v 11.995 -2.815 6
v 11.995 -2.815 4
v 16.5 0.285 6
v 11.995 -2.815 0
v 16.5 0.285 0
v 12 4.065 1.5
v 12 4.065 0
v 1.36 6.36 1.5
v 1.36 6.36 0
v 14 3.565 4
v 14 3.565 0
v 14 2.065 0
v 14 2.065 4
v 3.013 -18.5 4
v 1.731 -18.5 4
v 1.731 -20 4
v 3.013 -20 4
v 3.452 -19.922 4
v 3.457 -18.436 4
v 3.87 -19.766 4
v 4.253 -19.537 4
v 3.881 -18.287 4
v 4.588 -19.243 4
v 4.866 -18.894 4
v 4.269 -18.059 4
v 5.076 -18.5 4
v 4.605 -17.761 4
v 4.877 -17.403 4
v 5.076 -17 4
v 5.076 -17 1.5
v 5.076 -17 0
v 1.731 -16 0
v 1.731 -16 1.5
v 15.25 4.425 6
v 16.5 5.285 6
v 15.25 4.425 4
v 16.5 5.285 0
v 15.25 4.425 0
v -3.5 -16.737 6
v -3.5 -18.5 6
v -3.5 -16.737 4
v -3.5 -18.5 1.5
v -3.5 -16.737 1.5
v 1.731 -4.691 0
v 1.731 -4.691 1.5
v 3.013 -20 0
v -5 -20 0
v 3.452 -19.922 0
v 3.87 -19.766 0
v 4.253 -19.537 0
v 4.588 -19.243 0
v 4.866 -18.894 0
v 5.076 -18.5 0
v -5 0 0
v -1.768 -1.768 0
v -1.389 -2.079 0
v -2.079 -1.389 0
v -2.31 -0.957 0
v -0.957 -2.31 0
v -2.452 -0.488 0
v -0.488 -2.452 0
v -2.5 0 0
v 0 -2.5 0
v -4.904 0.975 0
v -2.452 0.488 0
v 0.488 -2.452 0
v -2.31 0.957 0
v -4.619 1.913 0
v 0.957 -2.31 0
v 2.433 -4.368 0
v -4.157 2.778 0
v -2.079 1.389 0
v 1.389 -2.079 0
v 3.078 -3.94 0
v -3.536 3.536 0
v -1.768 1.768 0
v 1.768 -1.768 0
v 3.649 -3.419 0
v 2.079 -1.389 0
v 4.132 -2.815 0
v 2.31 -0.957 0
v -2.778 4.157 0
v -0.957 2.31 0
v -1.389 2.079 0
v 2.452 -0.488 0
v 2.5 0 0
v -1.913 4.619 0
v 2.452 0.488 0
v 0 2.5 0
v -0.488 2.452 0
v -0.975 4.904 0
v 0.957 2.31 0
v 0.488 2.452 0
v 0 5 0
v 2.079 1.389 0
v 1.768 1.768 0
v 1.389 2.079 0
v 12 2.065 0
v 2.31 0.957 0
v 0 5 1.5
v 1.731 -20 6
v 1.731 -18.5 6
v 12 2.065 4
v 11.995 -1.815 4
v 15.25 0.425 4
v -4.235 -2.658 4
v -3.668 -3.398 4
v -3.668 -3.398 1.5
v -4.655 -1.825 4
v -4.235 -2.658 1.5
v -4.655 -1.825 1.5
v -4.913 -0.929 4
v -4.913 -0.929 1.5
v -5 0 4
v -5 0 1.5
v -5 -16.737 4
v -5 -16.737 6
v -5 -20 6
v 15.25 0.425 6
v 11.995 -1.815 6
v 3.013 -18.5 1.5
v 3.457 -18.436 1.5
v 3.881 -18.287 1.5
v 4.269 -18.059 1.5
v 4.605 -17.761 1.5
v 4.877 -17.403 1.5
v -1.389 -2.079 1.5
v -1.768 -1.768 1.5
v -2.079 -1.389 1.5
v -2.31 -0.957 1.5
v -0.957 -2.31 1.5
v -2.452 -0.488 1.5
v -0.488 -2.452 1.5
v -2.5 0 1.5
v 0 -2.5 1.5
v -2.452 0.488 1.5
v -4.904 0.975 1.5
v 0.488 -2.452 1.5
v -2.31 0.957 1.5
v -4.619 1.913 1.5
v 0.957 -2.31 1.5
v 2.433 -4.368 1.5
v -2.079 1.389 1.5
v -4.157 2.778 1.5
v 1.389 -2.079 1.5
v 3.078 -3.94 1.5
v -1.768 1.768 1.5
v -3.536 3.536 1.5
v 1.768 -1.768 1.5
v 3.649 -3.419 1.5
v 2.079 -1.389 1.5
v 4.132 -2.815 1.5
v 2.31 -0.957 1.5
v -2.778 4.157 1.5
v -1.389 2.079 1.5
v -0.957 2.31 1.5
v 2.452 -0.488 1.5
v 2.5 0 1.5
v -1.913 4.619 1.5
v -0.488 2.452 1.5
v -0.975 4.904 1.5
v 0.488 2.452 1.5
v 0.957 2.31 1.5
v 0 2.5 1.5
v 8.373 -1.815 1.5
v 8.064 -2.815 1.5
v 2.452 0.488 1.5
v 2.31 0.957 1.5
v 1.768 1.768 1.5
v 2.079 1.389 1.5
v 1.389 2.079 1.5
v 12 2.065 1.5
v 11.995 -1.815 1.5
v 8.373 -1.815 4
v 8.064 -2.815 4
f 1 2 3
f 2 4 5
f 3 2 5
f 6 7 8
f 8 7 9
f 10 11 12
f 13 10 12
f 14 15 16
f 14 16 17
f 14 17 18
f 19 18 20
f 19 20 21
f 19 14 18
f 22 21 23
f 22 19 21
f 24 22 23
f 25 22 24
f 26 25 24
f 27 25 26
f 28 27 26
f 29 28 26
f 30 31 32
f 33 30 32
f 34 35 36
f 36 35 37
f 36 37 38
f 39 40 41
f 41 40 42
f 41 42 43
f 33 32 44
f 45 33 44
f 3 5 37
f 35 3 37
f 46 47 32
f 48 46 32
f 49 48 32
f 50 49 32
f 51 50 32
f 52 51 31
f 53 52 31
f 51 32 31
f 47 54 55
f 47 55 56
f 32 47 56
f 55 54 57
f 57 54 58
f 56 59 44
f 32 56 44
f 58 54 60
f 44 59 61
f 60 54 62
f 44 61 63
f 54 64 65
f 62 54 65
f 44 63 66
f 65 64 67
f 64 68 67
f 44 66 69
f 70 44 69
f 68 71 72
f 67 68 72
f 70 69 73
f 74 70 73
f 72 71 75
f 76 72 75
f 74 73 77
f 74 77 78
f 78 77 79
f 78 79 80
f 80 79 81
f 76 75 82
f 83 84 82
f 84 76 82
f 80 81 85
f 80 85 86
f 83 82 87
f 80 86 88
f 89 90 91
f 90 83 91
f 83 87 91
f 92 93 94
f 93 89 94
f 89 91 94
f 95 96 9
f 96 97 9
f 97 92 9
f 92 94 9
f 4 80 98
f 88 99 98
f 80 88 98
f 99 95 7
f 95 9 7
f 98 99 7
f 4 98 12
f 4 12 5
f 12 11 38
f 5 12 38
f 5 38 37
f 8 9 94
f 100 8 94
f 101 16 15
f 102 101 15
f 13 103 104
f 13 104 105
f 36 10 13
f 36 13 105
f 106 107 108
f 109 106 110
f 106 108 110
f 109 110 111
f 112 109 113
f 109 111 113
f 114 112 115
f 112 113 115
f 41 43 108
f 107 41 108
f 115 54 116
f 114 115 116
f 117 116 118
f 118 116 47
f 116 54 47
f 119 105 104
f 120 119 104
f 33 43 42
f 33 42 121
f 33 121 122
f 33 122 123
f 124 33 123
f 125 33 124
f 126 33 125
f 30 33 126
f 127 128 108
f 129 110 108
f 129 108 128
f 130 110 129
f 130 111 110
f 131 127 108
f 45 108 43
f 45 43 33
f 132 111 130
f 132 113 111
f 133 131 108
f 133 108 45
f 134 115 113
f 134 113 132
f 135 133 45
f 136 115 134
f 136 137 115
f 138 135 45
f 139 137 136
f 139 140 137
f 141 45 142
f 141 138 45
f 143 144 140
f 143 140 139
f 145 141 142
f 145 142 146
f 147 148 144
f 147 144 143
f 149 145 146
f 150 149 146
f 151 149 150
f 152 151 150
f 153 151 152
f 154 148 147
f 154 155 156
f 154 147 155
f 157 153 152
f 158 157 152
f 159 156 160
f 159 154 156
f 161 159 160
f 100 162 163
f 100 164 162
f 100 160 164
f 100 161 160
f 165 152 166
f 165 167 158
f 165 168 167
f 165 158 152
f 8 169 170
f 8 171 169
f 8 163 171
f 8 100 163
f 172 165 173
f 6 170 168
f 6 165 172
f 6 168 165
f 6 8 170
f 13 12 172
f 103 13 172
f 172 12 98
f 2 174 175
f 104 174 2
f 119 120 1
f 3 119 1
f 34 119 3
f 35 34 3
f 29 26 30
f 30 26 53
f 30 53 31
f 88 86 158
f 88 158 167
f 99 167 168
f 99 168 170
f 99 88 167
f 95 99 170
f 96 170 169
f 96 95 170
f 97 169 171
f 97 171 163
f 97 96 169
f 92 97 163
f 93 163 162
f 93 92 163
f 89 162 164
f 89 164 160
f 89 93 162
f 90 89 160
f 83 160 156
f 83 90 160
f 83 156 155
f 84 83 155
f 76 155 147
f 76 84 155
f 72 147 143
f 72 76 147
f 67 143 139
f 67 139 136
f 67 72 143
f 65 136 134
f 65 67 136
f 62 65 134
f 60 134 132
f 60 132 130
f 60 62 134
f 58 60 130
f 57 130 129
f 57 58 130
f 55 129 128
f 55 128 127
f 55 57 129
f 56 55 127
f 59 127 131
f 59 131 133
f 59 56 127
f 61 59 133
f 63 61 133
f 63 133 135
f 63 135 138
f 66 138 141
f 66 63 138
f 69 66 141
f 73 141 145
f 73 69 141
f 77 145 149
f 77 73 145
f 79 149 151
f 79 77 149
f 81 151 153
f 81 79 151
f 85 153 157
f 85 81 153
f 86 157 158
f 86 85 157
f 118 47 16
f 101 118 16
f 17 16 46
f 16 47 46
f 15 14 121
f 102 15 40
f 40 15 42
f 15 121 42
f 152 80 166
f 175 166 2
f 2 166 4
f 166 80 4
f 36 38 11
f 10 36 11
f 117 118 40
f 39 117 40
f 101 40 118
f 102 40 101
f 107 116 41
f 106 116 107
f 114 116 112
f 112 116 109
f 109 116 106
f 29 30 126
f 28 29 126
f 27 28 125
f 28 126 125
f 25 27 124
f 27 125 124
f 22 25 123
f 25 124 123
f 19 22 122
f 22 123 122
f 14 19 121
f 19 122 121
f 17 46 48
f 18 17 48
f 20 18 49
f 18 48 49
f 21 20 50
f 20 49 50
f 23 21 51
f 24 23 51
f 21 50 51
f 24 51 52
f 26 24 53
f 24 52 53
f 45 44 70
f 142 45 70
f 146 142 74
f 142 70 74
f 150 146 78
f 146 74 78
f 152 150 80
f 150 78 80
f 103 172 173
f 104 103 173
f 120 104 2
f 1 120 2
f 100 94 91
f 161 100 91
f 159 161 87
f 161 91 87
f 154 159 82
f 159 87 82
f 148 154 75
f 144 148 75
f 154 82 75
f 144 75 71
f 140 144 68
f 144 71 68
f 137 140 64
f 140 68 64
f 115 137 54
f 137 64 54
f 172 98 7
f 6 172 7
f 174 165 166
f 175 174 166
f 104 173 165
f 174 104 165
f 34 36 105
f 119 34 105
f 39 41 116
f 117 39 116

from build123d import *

# Parameters (mm, degrees)
EXTRUDE_1_DEPTH   = 6
EXTRUDE_1_2_DEPTH = 6
EXTRUDE_2_DEPTH   = 4
SKETCH_1_4_R      = 2.5
EXTRUDE_3_DEPTH   = 1.5


with BuildPart() as part:
    # 스케치1 → 보스-돌출1 (new body)
    with BuildSketch(Plane.XY):
        Polygon((-3.5, -16.737022948), (-5, -16.737022948), (-5, -20), (1.73077212, -20), (1.73077212, -18.5), (-3.5, -18.5), align=None)
    extrude(amount=EXTRUDE_1_DEPTH)



with BuildPart() as body_2:
    # 스케치1 → Extrude 1 2 (new body)
    with BuildSketch(Plane.XY):
        Polygon((15.25, 0.424756417), (11.995170544, -1.81504482), (11.995170544, -2.81504482), (16.5, 0.284940209), (16.5, 5.284940209), (15.25, 4.424756417), align=None)
    extrude(amount=EXTRUDE_1_2_DEPTH)


with BuildPart() as part_1:
    add(part.part)

    add(body_2.part)  # 보스-돌출2 merges body 2
    # 스케치1<3> → 보스-돌출2 (add)
    with BuildSketch(Plane.XY):
        with BuildLine():
            ThreePointArc((-3.667720971, -3.398208775), (-4.655029799, -1.825019883), (-5, 0))
            Line((-5, 0), (-5, -16.737022948))
            Line((-5, -16.737022948), (-3.5, -16.737022948))
            Line((-3.5, -16.737022948), (-3.667720971, -3.398208775))
        make_face()
        with BuildLine():
            Line((1.73077212, -18.5), (1.73077212, -20))
            Line((1.73077212, -20), (3.012501912, -20))
            ThreePointArc((3.012501912, -20), (4.252676388, -19.536857224), (5.075756613, -18.5))
            Line((5.075756613, -18.5), (5.075756613, -17))
            ThreePointArc((5.075756613, -17), (4.268648237, -18.058826553), (3.012501912, -18.5))
            Line((3.012501912, -18.5), (1.73077212, -18.5))
        make_face()
        Polygon((14, 2.064572624), (12, 2.064572624), (11.995170544, -1.81504482), (15.25, 0.424756417), (15.25, 4.424756417), (14, 3.564572624), align=None)
        Polygon((8.372598905, -1.81504482), (8.063712244, -2.81504482), (11.995170544, -2.81504482), (11.995170544, -1.81504482), align=None)
    extrude(amount=EXTRUDE_2_DEPTH)

    # 스케치1<4> → 보스-돌출3 (add)
    with BuildSketch(Plane.XY):
        with BuildLine():
            ThreePointArc((0, 5), (-4.582087072, 2.001119203), (-3.667720971, -3.398208775))
            Line((-3.667720971, -3.398208775), (-3.5, -16.737022948))
            Line((-3.5, -16.737022948), (-3.5, -18.5))
            Line((-3.5, -18.5), (3.012501912, -18.5))
            ThreePointArc((3.012501912, -18.5), (4.268648237, -18.058826553), (5.075756613, -17))
            Line((5.075756613, -17), (1.73077212, -16))
            Line((1.73077212, -16), (1.73077212, -4.690887749))
            ThreePointArc((1.73077212, -4.690887749), (3.0778995, -3.940372402), (4.132253945, -2.81504482))
            Line((4.132253945, -2.81504482), (8.063712244, -2.81504482))
            Line((8.063712244, -2.81504482), (8.372598905, -1.81504482))
            Line((8.372598905, -1.81504482), (11.995170544, -1.81504482))
            Line((11.995170544, -1.81504482), (12, 2.064572624))
            Line((12, 2.064572624), (12, 4.064572624))
            Line((12, 4.064572624), (1.360324879, 6.360324879))
            Line((1.360324879, 6.360324879), (0, 5))
        make_face()
        Circle(SKETCH_1_4_R, mode=Mode.SUBTRACT)
    extrude(amount=EXTRUDE_3_DEPTH)


solid = part_1.part
